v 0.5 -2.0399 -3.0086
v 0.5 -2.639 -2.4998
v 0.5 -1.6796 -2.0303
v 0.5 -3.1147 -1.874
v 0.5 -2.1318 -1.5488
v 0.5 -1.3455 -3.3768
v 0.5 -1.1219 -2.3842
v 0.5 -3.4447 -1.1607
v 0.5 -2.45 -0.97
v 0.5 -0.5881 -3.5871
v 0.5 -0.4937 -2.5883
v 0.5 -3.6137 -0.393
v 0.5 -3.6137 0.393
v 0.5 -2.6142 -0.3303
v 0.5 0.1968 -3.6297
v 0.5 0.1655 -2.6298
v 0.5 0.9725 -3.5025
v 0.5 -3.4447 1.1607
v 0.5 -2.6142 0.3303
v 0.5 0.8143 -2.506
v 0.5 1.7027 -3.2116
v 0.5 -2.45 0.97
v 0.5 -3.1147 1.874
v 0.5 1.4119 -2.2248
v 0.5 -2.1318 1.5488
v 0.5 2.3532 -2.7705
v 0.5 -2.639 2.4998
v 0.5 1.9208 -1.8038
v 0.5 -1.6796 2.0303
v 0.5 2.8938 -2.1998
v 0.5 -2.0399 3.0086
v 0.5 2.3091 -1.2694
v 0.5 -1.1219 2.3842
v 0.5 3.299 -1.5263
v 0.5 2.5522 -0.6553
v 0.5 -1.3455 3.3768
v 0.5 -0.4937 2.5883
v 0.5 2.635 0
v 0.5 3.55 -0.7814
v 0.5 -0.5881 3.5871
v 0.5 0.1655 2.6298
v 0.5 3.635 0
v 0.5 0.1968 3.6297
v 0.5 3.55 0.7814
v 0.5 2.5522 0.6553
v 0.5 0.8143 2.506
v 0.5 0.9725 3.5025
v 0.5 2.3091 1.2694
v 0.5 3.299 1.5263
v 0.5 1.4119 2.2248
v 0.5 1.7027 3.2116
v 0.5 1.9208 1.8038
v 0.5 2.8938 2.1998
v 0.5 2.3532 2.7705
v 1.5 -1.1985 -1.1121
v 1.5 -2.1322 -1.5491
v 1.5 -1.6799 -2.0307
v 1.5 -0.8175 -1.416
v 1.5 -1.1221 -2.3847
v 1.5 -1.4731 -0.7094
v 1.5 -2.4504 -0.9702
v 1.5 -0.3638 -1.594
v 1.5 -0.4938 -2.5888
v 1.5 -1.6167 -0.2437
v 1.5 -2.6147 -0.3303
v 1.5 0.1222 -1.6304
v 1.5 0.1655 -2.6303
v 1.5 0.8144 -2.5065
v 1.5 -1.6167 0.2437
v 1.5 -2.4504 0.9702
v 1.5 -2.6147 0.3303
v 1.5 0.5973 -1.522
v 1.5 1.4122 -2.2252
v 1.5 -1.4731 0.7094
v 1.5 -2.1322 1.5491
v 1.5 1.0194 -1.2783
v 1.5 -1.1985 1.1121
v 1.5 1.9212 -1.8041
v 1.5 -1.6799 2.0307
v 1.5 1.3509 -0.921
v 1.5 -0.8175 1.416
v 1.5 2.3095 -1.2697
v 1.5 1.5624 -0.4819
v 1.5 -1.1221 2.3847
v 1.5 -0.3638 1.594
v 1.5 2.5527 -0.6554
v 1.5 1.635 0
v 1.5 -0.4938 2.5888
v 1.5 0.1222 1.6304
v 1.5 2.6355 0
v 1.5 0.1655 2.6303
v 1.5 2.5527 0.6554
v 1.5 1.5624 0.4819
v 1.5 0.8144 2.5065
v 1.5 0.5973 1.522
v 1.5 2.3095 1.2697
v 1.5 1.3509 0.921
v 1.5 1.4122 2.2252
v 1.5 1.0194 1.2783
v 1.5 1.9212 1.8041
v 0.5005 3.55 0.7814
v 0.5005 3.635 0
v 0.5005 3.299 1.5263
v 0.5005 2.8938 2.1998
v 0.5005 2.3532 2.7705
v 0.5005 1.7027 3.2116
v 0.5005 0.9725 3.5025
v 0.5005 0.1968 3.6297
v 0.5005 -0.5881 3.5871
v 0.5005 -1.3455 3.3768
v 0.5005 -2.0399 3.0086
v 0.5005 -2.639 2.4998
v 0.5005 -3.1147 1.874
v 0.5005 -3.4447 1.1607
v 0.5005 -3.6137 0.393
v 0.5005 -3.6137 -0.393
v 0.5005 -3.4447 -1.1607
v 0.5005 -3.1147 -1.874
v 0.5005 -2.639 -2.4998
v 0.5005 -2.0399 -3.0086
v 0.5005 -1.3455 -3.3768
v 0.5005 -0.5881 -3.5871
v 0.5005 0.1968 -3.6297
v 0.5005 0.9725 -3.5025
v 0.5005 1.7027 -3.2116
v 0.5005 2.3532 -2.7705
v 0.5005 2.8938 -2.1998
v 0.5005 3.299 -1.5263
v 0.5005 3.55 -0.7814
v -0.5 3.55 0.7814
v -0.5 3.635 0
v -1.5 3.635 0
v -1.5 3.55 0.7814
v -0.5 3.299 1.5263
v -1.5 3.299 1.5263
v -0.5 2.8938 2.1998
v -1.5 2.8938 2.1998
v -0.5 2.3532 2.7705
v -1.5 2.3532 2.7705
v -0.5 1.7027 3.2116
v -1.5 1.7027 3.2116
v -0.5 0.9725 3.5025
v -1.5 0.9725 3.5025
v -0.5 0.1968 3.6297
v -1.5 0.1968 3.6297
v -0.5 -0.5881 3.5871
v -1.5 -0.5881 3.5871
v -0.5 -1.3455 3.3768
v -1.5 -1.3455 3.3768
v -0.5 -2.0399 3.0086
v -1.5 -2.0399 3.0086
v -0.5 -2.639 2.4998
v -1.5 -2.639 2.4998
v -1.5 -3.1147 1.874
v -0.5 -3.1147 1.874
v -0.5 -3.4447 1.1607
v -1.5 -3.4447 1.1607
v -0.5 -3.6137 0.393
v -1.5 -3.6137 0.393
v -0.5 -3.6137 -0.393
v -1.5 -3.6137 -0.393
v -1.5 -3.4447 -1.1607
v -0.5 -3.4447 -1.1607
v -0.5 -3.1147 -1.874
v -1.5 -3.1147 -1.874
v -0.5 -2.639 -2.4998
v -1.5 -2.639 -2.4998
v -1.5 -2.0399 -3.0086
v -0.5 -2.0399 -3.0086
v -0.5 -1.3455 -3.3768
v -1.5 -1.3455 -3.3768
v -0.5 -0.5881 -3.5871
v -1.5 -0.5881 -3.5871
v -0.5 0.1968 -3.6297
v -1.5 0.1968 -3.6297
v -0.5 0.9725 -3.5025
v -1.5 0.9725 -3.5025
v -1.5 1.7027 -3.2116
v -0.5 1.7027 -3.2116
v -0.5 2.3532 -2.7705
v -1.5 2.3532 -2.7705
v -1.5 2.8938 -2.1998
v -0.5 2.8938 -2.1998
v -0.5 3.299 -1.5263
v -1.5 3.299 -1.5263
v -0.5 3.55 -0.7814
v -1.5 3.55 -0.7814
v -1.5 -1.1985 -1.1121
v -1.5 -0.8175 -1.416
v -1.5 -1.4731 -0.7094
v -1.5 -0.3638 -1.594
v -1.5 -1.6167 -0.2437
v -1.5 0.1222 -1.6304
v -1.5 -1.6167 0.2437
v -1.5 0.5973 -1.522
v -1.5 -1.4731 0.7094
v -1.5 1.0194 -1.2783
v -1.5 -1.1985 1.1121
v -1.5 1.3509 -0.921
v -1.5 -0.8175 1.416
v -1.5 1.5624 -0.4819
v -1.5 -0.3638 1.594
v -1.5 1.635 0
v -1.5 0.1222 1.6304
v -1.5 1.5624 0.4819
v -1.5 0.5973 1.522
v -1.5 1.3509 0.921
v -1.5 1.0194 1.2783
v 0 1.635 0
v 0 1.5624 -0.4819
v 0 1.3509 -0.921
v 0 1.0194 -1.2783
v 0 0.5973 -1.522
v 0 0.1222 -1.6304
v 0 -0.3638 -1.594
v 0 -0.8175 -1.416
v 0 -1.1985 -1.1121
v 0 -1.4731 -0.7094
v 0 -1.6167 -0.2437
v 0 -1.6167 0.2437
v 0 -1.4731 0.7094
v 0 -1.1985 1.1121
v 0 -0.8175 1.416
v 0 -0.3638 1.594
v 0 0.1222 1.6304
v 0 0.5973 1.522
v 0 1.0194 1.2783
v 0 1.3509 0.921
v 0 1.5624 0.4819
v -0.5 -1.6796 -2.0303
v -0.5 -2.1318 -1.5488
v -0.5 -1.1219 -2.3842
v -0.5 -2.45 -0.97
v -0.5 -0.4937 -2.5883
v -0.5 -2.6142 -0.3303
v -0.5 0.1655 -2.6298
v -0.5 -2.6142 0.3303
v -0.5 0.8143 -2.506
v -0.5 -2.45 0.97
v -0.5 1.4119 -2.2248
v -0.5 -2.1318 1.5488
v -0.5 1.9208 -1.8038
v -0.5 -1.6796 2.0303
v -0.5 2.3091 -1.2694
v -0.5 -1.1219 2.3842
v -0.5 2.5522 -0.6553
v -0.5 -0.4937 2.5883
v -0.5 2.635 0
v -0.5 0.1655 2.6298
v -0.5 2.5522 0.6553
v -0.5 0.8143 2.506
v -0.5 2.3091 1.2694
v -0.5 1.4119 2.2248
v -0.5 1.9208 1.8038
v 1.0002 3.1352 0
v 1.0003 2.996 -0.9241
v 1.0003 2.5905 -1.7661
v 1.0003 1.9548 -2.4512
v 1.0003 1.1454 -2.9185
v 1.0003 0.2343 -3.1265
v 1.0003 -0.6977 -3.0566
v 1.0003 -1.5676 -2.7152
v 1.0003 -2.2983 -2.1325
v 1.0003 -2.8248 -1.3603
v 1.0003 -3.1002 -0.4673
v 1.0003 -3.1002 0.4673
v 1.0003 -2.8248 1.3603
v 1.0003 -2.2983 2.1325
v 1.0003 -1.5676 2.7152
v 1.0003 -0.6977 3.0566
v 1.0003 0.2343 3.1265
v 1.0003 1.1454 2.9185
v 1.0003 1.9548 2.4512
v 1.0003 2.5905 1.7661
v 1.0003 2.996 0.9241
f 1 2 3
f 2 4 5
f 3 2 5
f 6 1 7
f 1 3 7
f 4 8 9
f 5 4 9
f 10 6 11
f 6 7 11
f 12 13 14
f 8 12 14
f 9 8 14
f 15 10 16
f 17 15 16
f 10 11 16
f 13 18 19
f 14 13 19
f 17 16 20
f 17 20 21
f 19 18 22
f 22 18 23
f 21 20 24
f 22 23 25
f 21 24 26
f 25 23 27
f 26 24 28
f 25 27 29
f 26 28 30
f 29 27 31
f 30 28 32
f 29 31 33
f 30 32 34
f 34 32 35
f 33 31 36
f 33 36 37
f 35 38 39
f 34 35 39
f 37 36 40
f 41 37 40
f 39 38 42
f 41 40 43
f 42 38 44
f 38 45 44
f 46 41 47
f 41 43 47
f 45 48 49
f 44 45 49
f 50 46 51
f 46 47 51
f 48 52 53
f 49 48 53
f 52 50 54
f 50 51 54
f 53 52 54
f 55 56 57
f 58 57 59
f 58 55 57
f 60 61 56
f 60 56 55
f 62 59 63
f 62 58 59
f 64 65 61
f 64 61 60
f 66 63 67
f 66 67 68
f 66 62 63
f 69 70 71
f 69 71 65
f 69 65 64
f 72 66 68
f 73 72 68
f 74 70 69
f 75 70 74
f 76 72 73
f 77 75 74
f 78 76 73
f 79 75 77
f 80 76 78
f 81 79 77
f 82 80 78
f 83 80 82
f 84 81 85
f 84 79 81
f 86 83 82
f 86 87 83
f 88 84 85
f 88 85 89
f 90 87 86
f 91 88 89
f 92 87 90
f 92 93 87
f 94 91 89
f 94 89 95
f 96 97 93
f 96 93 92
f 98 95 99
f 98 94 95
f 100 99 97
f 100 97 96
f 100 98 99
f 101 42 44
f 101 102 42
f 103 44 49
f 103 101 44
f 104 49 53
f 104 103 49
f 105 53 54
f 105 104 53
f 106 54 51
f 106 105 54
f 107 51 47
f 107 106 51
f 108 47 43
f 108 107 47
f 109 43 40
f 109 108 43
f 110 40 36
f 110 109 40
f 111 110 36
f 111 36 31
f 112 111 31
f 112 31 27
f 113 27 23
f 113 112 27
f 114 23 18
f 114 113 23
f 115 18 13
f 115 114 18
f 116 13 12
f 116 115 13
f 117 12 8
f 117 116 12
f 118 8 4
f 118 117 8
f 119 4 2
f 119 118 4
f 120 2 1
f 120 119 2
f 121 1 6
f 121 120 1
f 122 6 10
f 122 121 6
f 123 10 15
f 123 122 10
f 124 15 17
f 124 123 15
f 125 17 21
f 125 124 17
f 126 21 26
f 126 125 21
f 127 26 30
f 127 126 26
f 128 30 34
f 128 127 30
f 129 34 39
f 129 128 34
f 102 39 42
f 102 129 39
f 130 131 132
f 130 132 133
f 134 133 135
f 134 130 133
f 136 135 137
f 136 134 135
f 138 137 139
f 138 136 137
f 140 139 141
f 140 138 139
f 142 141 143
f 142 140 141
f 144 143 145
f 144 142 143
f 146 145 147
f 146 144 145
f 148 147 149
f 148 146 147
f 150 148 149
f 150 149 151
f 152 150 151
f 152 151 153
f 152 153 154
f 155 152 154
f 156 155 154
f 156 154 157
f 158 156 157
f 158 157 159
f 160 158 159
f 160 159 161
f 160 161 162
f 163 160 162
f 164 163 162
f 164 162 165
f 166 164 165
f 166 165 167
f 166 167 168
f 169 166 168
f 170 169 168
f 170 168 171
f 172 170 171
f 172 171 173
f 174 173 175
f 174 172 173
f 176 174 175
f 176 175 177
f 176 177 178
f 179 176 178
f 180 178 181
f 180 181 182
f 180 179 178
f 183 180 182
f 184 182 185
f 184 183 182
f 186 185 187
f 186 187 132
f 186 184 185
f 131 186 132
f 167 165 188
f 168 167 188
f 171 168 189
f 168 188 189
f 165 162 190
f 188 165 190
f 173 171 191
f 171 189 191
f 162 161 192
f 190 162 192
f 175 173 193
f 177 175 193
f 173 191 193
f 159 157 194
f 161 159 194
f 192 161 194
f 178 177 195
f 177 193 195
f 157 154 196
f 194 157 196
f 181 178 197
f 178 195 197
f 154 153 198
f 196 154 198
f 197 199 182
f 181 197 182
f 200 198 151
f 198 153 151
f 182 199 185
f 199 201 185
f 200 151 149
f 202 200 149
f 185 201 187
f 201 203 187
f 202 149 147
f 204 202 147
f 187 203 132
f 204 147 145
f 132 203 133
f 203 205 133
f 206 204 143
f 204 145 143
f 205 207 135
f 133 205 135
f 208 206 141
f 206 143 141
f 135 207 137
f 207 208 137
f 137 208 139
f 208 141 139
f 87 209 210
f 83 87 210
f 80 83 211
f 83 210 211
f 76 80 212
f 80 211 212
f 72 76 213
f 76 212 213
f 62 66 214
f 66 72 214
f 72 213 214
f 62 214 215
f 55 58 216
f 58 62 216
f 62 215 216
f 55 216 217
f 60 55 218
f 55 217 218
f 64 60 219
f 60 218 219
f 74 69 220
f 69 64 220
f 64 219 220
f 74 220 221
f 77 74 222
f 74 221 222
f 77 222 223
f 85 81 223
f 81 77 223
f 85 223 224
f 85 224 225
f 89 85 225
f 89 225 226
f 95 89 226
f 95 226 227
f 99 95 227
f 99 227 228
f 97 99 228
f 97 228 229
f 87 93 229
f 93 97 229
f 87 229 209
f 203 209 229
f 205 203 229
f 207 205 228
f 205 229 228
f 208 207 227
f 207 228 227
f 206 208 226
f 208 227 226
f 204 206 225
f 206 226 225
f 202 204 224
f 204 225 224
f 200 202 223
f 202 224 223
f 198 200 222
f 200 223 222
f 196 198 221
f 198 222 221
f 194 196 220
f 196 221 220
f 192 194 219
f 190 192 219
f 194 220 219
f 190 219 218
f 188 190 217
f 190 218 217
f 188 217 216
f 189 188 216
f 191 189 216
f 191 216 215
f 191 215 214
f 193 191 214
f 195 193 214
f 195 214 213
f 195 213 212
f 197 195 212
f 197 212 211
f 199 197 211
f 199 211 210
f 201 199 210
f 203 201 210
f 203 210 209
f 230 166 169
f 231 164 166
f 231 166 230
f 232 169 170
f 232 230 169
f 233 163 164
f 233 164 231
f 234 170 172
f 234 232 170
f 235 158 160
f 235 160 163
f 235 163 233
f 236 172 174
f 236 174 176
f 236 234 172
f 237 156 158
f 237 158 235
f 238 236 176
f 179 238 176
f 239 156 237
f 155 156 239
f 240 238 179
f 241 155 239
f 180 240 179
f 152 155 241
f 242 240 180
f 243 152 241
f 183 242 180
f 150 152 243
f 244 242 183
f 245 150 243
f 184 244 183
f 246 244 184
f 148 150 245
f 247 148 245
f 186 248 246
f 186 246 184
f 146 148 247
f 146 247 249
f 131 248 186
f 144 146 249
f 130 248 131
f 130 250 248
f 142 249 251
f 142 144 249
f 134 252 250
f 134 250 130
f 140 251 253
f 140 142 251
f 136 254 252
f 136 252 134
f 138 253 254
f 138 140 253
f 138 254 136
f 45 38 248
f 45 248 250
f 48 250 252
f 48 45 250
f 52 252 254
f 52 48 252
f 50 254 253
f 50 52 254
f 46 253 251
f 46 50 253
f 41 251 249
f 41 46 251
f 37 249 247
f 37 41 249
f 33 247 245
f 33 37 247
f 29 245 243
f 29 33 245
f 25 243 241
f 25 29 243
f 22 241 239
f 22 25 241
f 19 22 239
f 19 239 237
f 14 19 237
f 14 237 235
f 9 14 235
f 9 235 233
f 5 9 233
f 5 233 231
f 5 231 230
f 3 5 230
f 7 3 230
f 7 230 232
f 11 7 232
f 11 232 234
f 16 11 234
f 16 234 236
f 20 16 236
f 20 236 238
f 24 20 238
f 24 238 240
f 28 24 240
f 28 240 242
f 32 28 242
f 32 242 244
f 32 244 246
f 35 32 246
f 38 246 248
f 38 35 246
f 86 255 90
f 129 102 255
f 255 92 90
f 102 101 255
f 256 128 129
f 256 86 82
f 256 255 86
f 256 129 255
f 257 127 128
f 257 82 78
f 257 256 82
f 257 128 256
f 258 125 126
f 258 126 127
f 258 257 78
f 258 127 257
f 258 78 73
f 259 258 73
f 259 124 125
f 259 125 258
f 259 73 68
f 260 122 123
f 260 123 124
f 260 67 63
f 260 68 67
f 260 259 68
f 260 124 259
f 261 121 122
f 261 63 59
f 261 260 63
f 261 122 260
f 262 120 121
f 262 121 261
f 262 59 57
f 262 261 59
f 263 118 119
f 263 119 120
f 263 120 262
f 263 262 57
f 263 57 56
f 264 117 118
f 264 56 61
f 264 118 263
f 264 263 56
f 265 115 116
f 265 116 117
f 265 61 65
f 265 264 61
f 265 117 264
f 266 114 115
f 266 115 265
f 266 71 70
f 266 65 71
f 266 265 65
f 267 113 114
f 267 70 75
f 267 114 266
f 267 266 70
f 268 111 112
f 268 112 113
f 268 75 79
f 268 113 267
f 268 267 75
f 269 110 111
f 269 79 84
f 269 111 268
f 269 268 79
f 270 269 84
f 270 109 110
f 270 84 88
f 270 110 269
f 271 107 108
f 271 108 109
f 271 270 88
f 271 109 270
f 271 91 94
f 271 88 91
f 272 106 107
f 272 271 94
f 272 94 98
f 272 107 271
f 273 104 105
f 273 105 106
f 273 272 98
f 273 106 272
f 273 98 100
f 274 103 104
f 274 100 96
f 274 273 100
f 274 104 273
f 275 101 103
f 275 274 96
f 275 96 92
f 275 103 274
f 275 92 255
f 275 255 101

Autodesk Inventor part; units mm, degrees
ref_plane "YZ Plane" through (0, 0, 0) normal (1, 0, 0) x (0, 1, 0)
ref_plane "XZ Plane" through (0, 0, 0) normal (0, 1, 0) x (-1, 0, 0)
sketch "スケッチ1" plane through (0, 0, 0) normal (1, 0, 0) x (0, 1, 0)
  circle A0 centre (0, 0) radius 3.635
  circle A1 centre (0, 0) radius 1.635
  circle A2 centre (0, 0) radius 2.635
  dimension "d0" = 3.27
  dimension "d1" = 2
  dimension "d7" = 1
extrude "押し出し1" add sketch "スケッチ1" along normal mid plane 3 contours A0 | A2
ref_plane "作業平面1" through (0.5, 0, 0) normal (1, 0, 0) x (0, 0, -1)
extrude "押し出し3" cut sketch "スケッチ1" against normal blind 1 from surface at 0.5 contours A0
chamfer "面取り3" distance 1 angle 45 1 edges at (1.5, -3.635, 0)
properties part number "spacer_Φ3.2_1"
